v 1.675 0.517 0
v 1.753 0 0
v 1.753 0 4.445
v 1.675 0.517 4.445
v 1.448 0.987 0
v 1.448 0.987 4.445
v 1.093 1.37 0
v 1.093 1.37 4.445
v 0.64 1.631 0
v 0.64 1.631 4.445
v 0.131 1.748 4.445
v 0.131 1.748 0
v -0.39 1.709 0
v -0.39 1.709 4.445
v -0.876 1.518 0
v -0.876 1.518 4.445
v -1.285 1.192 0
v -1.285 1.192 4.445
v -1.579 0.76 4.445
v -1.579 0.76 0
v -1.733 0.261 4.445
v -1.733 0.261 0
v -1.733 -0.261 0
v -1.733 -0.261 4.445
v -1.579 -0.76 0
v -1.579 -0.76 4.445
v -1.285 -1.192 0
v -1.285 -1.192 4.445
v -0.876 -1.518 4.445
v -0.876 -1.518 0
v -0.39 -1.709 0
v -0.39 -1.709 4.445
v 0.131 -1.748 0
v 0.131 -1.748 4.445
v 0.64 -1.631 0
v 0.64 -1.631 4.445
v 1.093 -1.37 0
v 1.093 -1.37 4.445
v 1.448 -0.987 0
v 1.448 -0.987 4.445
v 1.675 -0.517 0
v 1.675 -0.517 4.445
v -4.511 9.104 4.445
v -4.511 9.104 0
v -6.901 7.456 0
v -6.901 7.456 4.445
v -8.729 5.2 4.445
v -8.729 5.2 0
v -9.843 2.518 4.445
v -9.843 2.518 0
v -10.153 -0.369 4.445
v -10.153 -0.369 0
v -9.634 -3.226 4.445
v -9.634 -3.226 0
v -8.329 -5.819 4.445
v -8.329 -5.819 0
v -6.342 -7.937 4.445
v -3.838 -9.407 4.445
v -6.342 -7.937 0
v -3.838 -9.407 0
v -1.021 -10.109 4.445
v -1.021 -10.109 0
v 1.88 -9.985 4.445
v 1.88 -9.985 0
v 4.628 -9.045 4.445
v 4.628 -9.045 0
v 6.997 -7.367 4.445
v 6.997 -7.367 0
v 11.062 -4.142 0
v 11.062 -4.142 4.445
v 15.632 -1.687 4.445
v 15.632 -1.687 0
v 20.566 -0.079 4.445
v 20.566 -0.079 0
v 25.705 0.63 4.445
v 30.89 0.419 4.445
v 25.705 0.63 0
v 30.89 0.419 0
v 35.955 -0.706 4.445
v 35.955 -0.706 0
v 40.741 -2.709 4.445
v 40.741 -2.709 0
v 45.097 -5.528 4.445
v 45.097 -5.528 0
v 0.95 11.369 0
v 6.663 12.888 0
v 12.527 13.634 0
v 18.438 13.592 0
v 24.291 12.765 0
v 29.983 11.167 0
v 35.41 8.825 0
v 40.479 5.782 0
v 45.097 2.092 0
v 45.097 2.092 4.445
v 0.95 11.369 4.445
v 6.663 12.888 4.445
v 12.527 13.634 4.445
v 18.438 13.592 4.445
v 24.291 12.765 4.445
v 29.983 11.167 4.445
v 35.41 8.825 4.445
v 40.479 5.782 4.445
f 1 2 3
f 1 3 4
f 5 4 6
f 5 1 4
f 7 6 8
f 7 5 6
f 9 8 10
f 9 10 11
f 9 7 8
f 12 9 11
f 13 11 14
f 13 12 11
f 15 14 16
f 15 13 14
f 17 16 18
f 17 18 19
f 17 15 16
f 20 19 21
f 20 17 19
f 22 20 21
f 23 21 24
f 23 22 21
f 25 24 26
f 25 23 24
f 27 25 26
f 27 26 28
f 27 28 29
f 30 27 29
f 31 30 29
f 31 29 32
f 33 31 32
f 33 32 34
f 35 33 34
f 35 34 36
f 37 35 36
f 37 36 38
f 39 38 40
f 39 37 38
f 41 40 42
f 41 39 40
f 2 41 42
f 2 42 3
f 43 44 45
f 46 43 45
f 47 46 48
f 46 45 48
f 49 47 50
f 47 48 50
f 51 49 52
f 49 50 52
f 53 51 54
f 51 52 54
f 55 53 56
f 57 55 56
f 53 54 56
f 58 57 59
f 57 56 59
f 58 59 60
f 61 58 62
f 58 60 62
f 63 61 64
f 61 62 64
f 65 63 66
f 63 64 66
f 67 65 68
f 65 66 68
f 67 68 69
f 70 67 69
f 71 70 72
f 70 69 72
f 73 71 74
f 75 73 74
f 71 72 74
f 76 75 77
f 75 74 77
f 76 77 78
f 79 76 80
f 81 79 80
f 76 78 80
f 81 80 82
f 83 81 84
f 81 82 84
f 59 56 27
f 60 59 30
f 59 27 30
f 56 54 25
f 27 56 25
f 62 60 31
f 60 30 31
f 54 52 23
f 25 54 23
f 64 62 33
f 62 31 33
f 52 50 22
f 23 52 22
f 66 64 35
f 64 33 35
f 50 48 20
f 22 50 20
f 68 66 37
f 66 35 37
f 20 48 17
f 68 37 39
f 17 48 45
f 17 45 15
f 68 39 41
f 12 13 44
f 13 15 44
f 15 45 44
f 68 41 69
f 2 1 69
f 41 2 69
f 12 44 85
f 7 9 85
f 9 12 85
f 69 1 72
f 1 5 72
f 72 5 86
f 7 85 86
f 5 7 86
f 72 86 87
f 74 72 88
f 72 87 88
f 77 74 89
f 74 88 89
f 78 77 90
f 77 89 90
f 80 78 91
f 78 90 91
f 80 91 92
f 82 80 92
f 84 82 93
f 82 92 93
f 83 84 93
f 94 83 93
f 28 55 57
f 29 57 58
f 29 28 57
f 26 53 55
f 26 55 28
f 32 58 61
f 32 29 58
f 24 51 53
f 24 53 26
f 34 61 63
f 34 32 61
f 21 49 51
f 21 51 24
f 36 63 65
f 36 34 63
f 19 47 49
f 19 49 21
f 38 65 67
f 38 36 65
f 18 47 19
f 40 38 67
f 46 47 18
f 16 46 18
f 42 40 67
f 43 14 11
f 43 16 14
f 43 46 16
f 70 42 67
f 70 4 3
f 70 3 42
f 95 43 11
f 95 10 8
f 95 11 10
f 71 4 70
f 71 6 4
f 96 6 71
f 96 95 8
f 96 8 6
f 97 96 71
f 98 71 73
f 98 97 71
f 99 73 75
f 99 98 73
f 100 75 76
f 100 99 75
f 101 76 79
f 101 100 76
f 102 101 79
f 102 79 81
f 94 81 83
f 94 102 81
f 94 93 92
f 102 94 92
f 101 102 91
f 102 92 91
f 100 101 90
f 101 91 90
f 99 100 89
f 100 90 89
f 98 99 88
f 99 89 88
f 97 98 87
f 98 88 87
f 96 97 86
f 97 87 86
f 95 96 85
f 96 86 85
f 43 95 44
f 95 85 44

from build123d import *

# Parameters (mm, degrees)
SKETCH1_R           = 1.7526
BOSS_EXTRUDE1_DEPTH = 4.445


with BuildPart() as part:
    # Sketch1 → Boss-Extrude1 (new body)
    with BuildSketch(Plane.XY):
        with BuildLine():
            Line((45.097053324, -5.527793834), (45.097053324, 2.092206166))
            ThreePointArc((45.097053324, 2.092206166), (21.378517637, 13.276466986), (-4.510590735, 9.103854745))
            ThreePointArc((-4.510590735, 9.103854745), (-8.328542576, -5.819018694), (6.997053324, -7.366603341))
            ThreePointArc((6.997053324, -7.366603341), (25.705466674, 0.630452091), (45.097053324, -5.527793834))
        make_face()
        Circle(SKETCH1_R, mode=Mode.SUBTRACT)
    extrude(amount=BOSS_EXTRUDE1_DEPTH)


solid = part.part
